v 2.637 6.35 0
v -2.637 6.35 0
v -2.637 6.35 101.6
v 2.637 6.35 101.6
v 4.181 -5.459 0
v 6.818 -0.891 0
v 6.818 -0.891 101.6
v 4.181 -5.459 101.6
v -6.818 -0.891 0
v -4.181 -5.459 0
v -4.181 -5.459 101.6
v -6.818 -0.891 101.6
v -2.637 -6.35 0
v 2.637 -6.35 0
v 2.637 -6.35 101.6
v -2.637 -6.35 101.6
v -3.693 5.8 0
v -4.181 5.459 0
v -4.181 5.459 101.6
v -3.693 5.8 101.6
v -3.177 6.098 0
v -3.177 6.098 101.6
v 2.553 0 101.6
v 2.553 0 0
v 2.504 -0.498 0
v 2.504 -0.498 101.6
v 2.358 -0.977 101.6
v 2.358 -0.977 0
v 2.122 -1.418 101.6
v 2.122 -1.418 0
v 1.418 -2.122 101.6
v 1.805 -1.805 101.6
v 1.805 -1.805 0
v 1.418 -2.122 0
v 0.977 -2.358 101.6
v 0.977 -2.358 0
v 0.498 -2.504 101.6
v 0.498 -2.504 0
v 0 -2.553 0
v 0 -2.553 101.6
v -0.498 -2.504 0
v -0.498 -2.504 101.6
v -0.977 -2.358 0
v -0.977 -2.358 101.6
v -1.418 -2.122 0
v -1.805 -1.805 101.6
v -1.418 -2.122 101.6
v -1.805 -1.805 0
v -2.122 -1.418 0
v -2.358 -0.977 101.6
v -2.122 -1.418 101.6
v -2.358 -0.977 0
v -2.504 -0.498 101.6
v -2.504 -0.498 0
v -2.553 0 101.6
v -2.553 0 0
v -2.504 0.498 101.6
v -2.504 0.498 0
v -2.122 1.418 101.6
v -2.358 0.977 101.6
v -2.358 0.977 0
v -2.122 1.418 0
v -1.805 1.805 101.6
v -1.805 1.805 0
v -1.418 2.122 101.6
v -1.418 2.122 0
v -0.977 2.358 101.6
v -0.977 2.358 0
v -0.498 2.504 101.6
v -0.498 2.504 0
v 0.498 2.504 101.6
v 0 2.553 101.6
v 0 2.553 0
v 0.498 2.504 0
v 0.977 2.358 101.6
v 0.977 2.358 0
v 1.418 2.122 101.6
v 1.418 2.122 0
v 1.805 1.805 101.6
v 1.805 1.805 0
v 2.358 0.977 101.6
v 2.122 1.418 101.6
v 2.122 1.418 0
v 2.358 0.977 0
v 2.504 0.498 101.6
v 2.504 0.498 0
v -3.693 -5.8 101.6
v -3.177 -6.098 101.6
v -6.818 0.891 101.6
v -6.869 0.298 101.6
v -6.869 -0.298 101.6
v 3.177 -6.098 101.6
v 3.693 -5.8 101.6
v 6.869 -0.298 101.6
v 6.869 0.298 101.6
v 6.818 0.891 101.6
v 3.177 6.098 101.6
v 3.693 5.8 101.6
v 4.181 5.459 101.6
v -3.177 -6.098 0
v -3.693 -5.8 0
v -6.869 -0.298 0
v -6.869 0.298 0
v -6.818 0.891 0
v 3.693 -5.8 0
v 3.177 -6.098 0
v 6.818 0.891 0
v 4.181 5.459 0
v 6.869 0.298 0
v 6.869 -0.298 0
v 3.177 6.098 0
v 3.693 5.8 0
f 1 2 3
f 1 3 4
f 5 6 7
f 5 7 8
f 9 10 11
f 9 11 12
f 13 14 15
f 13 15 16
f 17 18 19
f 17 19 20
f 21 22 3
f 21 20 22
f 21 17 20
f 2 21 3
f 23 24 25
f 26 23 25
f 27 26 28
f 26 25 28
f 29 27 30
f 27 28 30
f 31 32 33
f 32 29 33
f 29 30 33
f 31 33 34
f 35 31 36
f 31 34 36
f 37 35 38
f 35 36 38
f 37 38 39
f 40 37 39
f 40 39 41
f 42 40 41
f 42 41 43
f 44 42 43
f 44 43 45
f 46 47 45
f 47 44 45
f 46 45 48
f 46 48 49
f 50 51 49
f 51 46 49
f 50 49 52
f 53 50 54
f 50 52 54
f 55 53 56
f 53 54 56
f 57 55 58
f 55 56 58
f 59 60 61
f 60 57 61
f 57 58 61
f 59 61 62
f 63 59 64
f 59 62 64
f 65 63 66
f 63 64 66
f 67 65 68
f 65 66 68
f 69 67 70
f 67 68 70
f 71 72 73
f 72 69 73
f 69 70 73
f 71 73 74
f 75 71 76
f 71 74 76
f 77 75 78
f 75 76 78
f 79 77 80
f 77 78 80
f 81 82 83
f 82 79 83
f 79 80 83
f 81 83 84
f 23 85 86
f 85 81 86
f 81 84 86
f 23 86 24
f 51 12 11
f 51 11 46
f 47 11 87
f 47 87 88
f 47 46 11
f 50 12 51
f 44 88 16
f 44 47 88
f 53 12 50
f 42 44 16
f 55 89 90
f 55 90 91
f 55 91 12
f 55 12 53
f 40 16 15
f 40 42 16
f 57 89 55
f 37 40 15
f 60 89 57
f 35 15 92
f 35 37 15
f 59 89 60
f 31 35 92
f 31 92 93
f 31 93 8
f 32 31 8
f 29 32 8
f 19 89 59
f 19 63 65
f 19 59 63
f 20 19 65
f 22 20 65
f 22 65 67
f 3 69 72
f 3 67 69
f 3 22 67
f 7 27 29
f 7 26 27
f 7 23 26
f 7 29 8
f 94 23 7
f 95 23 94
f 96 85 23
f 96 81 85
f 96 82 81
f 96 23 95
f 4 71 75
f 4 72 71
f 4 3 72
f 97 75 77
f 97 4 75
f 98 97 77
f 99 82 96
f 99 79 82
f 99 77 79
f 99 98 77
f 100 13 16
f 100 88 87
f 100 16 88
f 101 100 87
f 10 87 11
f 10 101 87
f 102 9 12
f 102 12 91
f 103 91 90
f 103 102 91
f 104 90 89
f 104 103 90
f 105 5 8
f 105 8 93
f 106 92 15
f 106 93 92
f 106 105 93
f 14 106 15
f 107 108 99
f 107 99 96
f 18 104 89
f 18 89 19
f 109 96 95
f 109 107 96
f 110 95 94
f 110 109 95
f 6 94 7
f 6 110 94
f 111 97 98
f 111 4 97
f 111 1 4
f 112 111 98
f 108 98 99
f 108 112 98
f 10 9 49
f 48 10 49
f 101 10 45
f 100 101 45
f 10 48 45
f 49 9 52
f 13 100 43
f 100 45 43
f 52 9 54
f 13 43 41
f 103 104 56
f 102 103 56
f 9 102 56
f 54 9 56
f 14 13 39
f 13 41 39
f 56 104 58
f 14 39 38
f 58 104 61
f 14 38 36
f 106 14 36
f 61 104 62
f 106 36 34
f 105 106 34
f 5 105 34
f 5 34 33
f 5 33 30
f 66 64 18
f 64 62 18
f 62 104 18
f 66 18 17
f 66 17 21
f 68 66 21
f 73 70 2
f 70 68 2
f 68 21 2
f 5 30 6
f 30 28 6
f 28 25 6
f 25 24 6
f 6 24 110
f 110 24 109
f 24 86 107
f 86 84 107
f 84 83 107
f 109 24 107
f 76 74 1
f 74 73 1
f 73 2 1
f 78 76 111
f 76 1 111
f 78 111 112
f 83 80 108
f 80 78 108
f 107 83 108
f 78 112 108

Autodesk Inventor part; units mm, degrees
ref_plane "YZ Plane" through (0, 0, 0) normal (1, 0, 0) x (0, 1, 0)
ref_plane "XZ Plane" through (0, 0, 0) normal (0, 1, 0) x (-1, 0, 0)
ref_plane "XY Plane" through (0, 0, 0) normal (0, 0, 1) x (1, 0, 0)
sketch "Sketch1" plane through (0, 0, 0) normal (0, 0, 1) x (1, 0, 0)
  line L0 (4.1808, 5.4587) -> (6.8178, 0.8913)
  line L1 (6.8178, -0.8913) -> (4.1808, -5.4587)
  line L2 (2.637, -6.35) -> (-2.637, -6.35)
  line L3 (-4.1808, -5.4587) -> (-6.8178, -0.8913)
  line L4 (-6.8178, 0.8913) -> (-4.1808, 5.4587)
  line L5 (-2.637, 6.35) -> (2.637, 6.35)
  arc A0 (-6.8178, 0.8913) -> (-6.8178, -0.8913) centre (0, 0) ccw
  arc A1 (-4.1808, -5.4587) -> (-2.637, -6.35) centre (0, 0) ccw
  arc A2 (2.637, -6.35) -> (4.1808, -5.4587) centre (0, 0) ccw
  arc A3 (6.8178, -0.8913) -> (6.8178, 0.8913) centre (0, 0) ccw
  arc A4 (4.1808, 5.4587) -> (2.637, 6.35) centre (0, 0) ccw
  arc A5 (-2.637, 6.35) -> (-4.1808, 5.4587) centre (0, 0) ccw
  circle A6 centre (0, 0) radius 2.5527
  dimension "d2" = 12.7
  dimension "d3" = 6.8758
  dimension "d4" = 5.1054
extrude "Extrusion1" add sketch "Sketch1" along normal blind 101.6
properties part number "THUNDER HEX - 4" material "Aluminum 6061"
